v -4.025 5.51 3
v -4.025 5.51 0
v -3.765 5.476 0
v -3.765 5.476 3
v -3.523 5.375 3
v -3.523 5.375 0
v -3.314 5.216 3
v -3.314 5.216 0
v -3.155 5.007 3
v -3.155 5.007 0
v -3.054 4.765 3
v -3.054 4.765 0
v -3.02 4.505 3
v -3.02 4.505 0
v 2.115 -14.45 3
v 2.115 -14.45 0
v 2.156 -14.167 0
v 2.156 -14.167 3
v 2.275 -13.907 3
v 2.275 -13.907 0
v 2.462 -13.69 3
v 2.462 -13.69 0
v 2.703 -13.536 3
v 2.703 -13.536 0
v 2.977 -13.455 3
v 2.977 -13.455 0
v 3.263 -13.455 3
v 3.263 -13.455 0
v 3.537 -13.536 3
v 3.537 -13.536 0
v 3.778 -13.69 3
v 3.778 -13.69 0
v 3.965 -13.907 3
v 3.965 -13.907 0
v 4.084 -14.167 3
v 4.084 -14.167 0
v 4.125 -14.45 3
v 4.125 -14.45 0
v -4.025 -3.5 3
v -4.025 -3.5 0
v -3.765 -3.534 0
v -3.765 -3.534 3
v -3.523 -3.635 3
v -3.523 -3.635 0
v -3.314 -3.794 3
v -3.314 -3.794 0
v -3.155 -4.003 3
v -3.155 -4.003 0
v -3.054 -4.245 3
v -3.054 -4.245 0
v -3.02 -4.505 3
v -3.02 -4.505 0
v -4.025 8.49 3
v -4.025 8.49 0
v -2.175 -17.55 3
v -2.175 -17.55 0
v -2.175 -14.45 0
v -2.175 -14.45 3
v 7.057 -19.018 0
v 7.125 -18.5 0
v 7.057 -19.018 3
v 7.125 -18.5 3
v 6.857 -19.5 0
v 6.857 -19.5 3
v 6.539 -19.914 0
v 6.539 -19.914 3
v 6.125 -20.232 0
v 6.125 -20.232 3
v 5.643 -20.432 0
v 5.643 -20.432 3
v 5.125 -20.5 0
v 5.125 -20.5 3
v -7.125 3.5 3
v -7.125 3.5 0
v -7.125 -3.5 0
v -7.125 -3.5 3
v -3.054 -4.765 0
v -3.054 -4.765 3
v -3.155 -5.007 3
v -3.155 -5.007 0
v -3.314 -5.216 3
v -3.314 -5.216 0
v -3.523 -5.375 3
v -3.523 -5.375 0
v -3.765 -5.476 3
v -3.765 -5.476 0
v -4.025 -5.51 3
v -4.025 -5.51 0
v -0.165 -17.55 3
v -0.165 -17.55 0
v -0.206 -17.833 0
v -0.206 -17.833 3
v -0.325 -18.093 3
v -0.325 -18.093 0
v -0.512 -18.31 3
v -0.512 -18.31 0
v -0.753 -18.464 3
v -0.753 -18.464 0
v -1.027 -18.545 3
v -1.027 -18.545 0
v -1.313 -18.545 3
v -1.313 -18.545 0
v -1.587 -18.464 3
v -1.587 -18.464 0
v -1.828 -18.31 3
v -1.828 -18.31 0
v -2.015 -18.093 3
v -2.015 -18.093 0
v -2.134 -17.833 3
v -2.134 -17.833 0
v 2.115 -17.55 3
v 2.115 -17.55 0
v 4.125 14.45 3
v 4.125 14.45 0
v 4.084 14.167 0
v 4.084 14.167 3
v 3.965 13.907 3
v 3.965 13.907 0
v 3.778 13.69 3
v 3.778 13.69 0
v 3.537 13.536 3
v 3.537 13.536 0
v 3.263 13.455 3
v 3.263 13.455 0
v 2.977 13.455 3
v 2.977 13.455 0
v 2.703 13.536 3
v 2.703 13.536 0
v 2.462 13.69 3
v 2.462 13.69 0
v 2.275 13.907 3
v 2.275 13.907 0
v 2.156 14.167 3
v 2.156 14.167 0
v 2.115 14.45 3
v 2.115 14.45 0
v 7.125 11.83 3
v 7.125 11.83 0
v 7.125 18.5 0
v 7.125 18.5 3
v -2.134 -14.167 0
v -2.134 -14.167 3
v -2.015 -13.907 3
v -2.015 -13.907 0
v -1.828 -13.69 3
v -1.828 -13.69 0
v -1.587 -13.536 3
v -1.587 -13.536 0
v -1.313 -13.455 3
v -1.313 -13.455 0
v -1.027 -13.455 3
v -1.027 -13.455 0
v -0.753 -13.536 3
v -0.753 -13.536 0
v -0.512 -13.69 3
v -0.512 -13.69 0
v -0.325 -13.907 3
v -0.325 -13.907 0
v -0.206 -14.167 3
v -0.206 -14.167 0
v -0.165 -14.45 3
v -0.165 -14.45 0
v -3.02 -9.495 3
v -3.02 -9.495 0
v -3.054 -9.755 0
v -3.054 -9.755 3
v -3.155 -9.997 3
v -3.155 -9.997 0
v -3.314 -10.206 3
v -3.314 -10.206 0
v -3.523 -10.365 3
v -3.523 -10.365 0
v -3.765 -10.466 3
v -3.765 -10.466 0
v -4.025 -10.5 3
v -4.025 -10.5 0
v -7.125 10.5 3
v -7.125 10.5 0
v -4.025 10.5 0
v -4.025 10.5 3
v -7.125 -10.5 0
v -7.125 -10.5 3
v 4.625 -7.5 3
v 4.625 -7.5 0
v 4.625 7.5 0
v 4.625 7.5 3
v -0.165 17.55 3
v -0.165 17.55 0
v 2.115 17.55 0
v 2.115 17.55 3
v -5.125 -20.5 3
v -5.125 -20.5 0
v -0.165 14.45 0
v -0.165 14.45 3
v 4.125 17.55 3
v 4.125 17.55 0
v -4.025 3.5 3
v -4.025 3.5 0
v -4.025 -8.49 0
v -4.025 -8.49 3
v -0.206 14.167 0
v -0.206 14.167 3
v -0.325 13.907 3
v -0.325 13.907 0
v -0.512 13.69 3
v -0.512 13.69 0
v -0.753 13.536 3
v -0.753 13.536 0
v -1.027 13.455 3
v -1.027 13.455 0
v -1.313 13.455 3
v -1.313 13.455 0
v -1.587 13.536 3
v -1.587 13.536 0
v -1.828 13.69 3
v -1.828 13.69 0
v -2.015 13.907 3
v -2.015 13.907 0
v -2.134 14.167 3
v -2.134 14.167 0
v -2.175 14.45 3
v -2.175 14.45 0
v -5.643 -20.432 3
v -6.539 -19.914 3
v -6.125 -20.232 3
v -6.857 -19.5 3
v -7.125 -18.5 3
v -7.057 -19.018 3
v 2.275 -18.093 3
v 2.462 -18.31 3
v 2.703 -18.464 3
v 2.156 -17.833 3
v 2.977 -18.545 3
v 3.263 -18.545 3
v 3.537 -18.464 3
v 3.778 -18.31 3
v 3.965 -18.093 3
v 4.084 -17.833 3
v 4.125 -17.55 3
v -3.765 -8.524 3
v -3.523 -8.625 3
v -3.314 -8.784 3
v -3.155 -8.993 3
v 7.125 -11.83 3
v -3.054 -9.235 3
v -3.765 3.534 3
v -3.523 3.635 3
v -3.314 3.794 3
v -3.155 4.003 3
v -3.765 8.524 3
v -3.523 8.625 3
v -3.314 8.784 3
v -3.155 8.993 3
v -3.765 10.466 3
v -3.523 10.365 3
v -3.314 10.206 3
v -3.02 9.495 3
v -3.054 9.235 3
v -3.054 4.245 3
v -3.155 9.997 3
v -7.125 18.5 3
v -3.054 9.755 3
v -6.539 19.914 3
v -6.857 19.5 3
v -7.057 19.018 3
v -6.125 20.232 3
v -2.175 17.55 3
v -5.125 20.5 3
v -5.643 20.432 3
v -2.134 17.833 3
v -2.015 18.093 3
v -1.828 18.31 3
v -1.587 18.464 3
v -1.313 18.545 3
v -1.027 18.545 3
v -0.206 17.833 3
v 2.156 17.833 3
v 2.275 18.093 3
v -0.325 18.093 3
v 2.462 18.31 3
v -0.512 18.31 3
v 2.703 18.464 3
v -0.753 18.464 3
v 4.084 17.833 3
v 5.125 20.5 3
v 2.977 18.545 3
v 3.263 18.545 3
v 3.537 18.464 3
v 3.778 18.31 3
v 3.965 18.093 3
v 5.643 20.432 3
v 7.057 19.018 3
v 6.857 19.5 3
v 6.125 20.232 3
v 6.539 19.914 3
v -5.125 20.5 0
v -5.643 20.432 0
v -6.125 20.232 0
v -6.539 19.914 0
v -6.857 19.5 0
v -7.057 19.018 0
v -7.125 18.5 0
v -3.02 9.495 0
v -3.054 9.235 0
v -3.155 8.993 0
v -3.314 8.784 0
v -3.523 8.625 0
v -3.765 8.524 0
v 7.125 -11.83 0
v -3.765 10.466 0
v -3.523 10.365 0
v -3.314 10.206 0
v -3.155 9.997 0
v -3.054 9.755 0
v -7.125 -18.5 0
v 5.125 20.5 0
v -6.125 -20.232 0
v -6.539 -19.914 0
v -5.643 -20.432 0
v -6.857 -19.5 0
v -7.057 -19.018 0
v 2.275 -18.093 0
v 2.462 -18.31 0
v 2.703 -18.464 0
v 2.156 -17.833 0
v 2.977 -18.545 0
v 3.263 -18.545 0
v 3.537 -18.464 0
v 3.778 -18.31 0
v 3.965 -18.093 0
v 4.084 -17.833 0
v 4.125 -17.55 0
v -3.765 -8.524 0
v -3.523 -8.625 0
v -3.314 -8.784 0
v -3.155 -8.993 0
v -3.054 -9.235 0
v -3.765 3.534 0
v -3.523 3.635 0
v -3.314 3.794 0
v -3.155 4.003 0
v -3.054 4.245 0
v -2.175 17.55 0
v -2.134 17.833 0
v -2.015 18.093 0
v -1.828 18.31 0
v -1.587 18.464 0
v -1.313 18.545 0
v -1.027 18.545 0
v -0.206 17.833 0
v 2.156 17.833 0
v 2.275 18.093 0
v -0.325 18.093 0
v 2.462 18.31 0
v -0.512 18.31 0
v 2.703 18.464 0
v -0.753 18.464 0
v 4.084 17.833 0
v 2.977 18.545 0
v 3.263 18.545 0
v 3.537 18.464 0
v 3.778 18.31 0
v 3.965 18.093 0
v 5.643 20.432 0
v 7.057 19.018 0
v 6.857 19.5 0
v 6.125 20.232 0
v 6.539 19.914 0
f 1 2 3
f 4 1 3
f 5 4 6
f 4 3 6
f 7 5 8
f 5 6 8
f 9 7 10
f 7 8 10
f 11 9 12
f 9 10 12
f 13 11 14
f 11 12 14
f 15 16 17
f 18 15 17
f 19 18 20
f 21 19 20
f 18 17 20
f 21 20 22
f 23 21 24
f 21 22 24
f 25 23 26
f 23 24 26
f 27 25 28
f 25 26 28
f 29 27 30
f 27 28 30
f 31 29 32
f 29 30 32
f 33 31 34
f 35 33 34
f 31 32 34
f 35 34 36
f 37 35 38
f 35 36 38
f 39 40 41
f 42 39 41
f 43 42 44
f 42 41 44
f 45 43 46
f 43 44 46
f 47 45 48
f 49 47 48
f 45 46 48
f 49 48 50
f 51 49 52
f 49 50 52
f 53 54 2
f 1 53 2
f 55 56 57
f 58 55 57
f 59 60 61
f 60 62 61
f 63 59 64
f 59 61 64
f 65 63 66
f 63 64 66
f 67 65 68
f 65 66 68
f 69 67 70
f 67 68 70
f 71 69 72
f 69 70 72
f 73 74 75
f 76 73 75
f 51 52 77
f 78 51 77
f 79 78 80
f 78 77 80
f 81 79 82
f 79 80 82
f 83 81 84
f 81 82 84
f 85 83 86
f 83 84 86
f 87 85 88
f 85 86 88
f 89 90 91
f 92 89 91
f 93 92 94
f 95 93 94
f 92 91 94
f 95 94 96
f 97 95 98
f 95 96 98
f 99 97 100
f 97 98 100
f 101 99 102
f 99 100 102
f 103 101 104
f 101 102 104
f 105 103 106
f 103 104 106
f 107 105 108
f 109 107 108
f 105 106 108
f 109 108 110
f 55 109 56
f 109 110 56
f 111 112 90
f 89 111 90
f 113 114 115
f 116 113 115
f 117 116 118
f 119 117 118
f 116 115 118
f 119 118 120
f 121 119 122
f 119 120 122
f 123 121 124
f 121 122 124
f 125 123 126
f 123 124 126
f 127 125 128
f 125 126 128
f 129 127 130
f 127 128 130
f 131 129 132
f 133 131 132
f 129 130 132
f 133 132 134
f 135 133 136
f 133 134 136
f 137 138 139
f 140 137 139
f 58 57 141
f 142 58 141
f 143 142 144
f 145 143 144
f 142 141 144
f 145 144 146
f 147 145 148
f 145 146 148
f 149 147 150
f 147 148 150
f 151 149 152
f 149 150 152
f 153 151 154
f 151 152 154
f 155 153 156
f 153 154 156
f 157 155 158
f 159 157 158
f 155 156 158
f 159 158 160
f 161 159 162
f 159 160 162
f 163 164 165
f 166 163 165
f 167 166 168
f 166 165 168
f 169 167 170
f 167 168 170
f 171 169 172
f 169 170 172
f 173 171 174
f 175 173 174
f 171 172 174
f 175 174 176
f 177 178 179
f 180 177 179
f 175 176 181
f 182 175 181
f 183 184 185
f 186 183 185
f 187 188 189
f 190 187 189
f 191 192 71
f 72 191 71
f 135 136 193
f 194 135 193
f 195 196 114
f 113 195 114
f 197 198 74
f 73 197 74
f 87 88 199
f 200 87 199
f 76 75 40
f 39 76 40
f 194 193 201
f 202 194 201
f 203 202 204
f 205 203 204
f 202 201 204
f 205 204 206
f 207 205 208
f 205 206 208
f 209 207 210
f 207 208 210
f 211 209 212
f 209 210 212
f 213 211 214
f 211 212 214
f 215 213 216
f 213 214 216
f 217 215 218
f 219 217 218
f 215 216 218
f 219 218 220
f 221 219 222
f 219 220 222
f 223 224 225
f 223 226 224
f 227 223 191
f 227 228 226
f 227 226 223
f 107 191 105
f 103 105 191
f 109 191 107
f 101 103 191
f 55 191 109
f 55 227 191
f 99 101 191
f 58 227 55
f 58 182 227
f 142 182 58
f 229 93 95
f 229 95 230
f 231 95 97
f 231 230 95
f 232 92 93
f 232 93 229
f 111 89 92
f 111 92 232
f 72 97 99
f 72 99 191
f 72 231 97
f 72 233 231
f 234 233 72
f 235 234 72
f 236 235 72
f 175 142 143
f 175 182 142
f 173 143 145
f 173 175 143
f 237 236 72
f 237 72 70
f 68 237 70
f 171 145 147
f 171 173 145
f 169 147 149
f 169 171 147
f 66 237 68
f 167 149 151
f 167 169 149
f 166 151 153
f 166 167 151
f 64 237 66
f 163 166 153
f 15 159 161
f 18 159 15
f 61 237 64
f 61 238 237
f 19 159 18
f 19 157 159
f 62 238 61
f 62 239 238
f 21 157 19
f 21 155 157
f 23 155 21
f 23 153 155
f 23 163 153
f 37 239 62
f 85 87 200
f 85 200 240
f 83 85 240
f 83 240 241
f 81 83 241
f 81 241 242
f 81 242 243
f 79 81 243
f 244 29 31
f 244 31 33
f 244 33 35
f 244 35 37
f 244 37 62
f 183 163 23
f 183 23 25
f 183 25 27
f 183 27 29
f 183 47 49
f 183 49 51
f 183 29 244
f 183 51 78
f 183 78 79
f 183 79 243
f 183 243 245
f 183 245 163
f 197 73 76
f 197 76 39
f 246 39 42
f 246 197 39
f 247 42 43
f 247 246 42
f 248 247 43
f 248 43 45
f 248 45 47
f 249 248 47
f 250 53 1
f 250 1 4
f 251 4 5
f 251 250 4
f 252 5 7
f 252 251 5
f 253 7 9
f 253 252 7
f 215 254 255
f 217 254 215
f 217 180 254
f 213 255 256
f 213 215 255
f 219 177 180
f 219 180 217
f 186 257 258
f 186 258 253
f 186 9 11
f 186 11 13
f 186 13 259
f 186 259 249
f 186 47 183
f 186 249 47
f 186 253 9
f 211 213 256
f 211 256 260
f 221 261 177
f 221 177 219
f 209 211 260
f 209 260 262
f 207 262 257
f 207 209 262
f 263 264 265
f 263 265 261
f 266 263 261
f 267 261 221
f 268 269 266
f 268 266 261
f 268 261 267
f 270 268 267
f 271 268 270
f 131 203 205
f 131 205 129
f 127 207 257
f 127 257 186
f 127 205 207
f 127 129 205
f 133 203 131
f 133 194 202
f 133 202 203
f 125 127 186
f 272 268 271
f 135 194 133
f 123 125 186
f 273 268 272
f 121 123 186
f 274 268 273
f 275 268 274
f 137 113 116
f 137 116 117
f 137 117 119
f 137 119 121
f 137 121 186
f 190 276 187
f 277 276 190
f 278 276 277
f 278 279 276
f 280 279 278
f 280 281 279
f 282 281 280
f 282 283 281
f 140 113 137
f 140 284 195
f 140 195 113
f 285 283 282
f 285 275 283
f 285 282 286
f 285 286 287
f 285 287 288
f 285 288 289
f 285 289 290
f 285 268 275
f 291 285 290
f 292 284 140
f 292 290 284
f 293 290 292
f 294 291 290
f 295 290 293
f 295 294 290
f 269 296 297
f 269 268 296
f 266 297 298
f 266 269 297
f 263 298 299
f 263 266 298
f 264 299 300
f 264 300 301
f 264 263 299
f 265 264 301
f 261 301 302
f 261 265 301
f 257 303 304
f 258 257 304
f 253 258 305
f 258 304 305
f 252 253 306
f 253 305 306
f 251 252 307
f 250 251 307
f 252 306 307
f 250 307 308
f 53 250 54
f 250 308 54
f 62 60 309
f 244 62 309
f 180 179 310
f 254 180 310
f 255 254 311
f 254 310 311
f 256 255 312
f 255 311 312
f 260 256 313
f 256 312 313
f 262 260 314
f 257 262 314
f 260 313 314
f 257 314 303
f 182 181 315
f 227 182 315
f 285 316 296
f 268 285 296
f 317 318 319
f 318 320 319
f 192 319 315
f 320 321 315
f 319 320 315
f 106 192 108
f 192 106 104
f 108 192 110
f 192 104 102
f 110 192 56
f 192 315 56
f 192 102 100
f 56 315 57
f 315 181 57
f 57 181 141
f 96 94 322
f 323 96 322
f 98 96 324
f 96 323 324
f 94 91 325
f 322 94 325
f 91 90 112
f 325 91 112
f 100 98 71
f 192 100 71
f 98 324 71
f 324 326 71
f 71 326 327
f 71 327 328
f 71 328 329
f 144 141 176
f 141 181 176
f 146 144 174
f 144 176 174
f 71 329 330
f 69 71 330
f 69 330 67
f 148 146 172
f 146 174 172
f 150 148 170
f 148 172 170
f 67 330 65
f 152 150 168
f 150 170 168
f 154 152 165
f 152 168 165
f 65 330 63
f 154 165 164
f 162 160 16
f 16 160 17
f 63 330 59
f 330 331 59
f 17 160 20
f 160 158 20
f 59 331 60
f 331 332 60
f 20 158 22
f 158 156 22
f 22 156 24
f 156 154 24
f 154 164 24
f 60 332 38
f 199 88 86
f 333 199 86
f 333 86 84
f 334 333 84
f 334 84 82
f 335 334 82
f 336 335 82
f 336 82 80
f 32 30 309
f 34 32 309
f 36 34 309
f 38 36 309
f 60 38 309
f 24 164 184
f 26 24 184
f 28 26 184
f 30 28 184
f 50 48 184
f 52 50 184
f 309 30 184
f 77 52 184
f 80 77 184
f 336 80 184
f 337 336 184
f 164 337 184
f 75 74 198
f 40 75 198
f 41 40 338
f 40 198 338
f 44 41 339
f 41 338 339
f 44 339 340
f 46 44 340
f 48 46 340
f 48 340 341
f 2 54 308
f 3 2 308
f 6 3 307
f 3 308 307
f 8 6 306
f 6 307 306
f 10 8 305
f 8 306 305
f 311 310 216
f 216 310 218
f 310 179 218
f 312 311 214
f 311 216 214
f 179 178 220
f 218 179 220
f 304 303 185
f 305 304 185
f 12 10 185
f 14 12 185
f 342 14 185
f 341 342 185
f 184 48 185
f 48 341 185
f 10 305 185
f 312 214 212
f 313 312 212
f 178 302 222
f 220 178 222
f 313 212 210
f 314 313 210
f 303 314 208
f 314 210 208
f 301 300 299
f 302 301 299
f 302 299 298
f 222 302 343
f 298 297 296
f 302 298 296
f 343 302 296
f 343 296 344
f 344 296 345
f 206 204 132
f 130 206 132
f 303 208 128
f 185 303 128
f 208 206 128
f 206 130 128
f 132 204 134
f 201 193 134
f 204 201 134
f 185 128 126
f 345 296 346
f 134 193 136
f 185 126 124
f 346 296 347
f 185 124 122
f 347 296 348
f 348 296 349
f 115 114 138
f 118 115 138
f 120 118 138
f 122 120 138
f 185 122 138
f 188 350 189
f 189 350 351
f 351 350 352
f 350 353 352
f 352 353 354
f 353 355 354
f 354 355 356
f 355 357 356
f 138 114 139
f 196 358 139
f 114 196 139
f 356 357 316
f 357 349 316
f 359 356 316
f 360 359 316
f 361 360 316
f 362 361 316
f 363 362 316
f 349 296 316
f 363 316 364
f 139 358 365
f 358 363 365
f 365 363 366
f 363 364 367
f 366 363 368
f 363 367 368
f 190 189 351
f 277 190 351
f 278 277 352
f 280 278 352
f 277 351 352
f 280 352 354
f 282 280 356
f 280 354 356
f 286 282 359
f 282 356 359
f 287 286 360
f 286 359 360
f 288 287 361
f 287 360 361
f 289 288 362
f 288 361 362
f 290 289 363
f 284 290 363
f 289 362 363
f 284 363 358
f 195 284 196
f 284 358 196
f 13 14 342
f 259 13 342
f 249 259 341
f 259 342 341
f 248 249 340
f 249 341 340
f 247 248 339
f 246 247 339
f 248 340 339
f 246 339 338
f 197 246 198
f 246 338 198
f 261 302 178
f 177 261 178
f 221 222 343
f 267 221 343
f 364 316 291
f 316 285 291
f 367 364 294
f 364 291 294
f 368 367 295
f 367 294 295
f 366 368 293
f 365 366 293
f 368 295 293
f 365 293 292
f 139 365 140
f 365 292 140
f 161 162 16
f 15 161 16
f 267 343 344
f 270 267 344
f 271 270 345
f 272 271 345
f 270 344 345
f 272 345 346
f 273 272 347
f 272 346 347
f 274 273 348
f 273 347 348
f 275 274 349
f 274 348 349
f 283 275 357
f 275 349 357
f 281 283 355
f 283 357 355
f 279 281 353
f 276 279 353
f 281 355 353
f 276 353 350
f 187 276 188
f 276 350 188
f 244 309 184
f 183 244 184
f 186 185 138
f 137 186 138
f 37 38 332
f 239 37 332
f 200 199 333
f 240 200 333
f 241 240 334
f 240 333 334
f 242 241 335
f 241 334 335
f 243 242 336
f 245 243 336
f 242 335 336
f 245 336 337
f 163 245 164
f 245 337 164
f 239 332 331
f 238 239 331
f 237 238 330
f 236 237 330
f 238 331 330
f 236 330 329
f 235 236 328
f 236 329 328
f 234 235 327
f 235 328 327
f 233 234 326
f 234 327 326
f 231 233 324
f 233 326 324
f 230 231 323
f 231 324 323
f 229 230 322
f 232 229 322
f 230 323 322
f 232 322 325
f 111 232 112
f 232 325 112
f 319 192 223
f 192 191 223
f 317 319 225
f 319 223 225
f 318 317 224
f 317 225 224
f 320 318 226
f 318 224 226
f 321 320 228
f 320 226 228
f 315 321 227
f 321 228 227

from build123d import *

# Parameters (mm, degrees)
EXTRUDE_1_DEPTH = 3
FILLET_1_R      = 2


with BuildPart() as part:
    # 草图1 → 凸台-拉伸1 (new body)
    with BuildSketch(Plane.XY):
        with BuildLine():
            Line((7.125, 20.5), (-7.125, 20.5))
            Line((-7.125, 20.5), (-7.125, 10.5))
            Line((-7.125, 10.5), (-4.025, 10.5))
            ThreePointArc((-4.025, 10.5), (-3.314357685, 10.205642315), (-3.02, 9.495))
            ThreePointArc((-3.02, 9.495), (-3.314357685, 8.784357685), (-4.025, 8.49))
            Line((-4.025, 8.49), (-4.025, 5.51))
            ThreePointArc((-4.025, 5.51), (-3.314357685, 5.215642315), (-3.02, 4.505))
            ThreePointArc((-3.02, 4.505), (-3.314357685, 3.794357685), (-4.025, 3.5))
            Line((-4.025, 3.5), (-7.125, 3.5))
            Line((-7.125, 3.5), (-7.125, -3.5))
            Line((-7.125, -3.5), (-4.025, -3.5))
            ThreePointArc((-4.025, -3.5), (-3.314357685, -3.794357685), (-3.02, -4.505))
            ThreePointArc((-3.02, -4.505), (-3.314357685, -5.215642315), (-4.025, -5.51))
            Line((-4.025, -5.51), (-4.025, -8.49))
            ThreePointArc((-4.025, -8.49), (-3.314357685, -8.784357685), (-3.02, -9.495))
            ThreePointArc((-3.02, -9.495), (-3.314357685, -10.205642315), (-4.025, -10.5))
            Line((-4.025, -10.5), (-7.125, -10.5))
            Line((-7.125, -10.5), (-7.125, -20.5))
            Line((-7.125, -20.5), (7.125, -20.5))
            Line((7.125, -20.5), (7.125, -11.830127019))
            Line((7.125, -11.830127019), (4.625, -7.5))
            Line((4.625, -7.5), (4.625, 7.5))
            Line((4.625, 7.5), (7.125, 11.830127019))
            Line((7.125, 11.830127019), (7.125, 20.5))
        make_face()
        with BuildLine():
            Line((2.115, -17.55), (-0.165, -17.55))
            ThreePointArc((-0.165, -17.55), (-1.17, -18.555), (-2.175, -17.55))
            Line((-2.175, -17.55), (-2.175, -14.45))
            ThreePointArc((-2.175, -14.45), (-1.17, -13.445), (-0.165, -14.45))
            Line((-0.165, -14.45), (2.115, -14.45))
            ThreePointArc((2.115, -14.45), (3.12, -13.445), (4.125, -14.45))
            Line((4.125, -14.45), (4.125, -17.55))
            ThreePointArc((4.125, -17.55), (3.12, -18.555), (2.115, -17.55))
        make_face(mode=Mode.SUBTRACT)
        with BuildLine():
            Line((2.115, 14.45), (-0.165, 14.45))
            ThreePointArc((-0.165, 14.45), (-1.17, 13.445), (-2.175, 14.45))
            Line((-2.175, 14.45), (-2.175, 17.55))
            ThreePointArc((-2.175, 17.55), (-1.17, 18.555), (-0.165, 17.55))
            Line((-0.165, 17.55), (2.115, 17.55))
            ThreePointArc((2.115, 17.55), (3.12, 18.555), (4.125, 17.55))
            Line((4.125, 17.55), (4.125, 14.45))
            ThreePointArc((4.125, 14.45), (3.12, 13.445), (2.115, 14.45))
        make_face(mode=Mode.SUBTRACT)
    extrude(amount=EXTRUDE_1_DEPTH)

    # 圆角1
    fillet_1_edges = [part.edges().sort_by_distance(p)[0] for p in [
        (-7.125, 20.5, 1.5),
        (7.125, 20.5, 1.5),
        (7.125, -20.5, 1.5),
        (-7.125, -20.5, 1.5),
    ]]
    fillet(fillet_1_edges, radius=FILLET_1_R)


solid = part.part
